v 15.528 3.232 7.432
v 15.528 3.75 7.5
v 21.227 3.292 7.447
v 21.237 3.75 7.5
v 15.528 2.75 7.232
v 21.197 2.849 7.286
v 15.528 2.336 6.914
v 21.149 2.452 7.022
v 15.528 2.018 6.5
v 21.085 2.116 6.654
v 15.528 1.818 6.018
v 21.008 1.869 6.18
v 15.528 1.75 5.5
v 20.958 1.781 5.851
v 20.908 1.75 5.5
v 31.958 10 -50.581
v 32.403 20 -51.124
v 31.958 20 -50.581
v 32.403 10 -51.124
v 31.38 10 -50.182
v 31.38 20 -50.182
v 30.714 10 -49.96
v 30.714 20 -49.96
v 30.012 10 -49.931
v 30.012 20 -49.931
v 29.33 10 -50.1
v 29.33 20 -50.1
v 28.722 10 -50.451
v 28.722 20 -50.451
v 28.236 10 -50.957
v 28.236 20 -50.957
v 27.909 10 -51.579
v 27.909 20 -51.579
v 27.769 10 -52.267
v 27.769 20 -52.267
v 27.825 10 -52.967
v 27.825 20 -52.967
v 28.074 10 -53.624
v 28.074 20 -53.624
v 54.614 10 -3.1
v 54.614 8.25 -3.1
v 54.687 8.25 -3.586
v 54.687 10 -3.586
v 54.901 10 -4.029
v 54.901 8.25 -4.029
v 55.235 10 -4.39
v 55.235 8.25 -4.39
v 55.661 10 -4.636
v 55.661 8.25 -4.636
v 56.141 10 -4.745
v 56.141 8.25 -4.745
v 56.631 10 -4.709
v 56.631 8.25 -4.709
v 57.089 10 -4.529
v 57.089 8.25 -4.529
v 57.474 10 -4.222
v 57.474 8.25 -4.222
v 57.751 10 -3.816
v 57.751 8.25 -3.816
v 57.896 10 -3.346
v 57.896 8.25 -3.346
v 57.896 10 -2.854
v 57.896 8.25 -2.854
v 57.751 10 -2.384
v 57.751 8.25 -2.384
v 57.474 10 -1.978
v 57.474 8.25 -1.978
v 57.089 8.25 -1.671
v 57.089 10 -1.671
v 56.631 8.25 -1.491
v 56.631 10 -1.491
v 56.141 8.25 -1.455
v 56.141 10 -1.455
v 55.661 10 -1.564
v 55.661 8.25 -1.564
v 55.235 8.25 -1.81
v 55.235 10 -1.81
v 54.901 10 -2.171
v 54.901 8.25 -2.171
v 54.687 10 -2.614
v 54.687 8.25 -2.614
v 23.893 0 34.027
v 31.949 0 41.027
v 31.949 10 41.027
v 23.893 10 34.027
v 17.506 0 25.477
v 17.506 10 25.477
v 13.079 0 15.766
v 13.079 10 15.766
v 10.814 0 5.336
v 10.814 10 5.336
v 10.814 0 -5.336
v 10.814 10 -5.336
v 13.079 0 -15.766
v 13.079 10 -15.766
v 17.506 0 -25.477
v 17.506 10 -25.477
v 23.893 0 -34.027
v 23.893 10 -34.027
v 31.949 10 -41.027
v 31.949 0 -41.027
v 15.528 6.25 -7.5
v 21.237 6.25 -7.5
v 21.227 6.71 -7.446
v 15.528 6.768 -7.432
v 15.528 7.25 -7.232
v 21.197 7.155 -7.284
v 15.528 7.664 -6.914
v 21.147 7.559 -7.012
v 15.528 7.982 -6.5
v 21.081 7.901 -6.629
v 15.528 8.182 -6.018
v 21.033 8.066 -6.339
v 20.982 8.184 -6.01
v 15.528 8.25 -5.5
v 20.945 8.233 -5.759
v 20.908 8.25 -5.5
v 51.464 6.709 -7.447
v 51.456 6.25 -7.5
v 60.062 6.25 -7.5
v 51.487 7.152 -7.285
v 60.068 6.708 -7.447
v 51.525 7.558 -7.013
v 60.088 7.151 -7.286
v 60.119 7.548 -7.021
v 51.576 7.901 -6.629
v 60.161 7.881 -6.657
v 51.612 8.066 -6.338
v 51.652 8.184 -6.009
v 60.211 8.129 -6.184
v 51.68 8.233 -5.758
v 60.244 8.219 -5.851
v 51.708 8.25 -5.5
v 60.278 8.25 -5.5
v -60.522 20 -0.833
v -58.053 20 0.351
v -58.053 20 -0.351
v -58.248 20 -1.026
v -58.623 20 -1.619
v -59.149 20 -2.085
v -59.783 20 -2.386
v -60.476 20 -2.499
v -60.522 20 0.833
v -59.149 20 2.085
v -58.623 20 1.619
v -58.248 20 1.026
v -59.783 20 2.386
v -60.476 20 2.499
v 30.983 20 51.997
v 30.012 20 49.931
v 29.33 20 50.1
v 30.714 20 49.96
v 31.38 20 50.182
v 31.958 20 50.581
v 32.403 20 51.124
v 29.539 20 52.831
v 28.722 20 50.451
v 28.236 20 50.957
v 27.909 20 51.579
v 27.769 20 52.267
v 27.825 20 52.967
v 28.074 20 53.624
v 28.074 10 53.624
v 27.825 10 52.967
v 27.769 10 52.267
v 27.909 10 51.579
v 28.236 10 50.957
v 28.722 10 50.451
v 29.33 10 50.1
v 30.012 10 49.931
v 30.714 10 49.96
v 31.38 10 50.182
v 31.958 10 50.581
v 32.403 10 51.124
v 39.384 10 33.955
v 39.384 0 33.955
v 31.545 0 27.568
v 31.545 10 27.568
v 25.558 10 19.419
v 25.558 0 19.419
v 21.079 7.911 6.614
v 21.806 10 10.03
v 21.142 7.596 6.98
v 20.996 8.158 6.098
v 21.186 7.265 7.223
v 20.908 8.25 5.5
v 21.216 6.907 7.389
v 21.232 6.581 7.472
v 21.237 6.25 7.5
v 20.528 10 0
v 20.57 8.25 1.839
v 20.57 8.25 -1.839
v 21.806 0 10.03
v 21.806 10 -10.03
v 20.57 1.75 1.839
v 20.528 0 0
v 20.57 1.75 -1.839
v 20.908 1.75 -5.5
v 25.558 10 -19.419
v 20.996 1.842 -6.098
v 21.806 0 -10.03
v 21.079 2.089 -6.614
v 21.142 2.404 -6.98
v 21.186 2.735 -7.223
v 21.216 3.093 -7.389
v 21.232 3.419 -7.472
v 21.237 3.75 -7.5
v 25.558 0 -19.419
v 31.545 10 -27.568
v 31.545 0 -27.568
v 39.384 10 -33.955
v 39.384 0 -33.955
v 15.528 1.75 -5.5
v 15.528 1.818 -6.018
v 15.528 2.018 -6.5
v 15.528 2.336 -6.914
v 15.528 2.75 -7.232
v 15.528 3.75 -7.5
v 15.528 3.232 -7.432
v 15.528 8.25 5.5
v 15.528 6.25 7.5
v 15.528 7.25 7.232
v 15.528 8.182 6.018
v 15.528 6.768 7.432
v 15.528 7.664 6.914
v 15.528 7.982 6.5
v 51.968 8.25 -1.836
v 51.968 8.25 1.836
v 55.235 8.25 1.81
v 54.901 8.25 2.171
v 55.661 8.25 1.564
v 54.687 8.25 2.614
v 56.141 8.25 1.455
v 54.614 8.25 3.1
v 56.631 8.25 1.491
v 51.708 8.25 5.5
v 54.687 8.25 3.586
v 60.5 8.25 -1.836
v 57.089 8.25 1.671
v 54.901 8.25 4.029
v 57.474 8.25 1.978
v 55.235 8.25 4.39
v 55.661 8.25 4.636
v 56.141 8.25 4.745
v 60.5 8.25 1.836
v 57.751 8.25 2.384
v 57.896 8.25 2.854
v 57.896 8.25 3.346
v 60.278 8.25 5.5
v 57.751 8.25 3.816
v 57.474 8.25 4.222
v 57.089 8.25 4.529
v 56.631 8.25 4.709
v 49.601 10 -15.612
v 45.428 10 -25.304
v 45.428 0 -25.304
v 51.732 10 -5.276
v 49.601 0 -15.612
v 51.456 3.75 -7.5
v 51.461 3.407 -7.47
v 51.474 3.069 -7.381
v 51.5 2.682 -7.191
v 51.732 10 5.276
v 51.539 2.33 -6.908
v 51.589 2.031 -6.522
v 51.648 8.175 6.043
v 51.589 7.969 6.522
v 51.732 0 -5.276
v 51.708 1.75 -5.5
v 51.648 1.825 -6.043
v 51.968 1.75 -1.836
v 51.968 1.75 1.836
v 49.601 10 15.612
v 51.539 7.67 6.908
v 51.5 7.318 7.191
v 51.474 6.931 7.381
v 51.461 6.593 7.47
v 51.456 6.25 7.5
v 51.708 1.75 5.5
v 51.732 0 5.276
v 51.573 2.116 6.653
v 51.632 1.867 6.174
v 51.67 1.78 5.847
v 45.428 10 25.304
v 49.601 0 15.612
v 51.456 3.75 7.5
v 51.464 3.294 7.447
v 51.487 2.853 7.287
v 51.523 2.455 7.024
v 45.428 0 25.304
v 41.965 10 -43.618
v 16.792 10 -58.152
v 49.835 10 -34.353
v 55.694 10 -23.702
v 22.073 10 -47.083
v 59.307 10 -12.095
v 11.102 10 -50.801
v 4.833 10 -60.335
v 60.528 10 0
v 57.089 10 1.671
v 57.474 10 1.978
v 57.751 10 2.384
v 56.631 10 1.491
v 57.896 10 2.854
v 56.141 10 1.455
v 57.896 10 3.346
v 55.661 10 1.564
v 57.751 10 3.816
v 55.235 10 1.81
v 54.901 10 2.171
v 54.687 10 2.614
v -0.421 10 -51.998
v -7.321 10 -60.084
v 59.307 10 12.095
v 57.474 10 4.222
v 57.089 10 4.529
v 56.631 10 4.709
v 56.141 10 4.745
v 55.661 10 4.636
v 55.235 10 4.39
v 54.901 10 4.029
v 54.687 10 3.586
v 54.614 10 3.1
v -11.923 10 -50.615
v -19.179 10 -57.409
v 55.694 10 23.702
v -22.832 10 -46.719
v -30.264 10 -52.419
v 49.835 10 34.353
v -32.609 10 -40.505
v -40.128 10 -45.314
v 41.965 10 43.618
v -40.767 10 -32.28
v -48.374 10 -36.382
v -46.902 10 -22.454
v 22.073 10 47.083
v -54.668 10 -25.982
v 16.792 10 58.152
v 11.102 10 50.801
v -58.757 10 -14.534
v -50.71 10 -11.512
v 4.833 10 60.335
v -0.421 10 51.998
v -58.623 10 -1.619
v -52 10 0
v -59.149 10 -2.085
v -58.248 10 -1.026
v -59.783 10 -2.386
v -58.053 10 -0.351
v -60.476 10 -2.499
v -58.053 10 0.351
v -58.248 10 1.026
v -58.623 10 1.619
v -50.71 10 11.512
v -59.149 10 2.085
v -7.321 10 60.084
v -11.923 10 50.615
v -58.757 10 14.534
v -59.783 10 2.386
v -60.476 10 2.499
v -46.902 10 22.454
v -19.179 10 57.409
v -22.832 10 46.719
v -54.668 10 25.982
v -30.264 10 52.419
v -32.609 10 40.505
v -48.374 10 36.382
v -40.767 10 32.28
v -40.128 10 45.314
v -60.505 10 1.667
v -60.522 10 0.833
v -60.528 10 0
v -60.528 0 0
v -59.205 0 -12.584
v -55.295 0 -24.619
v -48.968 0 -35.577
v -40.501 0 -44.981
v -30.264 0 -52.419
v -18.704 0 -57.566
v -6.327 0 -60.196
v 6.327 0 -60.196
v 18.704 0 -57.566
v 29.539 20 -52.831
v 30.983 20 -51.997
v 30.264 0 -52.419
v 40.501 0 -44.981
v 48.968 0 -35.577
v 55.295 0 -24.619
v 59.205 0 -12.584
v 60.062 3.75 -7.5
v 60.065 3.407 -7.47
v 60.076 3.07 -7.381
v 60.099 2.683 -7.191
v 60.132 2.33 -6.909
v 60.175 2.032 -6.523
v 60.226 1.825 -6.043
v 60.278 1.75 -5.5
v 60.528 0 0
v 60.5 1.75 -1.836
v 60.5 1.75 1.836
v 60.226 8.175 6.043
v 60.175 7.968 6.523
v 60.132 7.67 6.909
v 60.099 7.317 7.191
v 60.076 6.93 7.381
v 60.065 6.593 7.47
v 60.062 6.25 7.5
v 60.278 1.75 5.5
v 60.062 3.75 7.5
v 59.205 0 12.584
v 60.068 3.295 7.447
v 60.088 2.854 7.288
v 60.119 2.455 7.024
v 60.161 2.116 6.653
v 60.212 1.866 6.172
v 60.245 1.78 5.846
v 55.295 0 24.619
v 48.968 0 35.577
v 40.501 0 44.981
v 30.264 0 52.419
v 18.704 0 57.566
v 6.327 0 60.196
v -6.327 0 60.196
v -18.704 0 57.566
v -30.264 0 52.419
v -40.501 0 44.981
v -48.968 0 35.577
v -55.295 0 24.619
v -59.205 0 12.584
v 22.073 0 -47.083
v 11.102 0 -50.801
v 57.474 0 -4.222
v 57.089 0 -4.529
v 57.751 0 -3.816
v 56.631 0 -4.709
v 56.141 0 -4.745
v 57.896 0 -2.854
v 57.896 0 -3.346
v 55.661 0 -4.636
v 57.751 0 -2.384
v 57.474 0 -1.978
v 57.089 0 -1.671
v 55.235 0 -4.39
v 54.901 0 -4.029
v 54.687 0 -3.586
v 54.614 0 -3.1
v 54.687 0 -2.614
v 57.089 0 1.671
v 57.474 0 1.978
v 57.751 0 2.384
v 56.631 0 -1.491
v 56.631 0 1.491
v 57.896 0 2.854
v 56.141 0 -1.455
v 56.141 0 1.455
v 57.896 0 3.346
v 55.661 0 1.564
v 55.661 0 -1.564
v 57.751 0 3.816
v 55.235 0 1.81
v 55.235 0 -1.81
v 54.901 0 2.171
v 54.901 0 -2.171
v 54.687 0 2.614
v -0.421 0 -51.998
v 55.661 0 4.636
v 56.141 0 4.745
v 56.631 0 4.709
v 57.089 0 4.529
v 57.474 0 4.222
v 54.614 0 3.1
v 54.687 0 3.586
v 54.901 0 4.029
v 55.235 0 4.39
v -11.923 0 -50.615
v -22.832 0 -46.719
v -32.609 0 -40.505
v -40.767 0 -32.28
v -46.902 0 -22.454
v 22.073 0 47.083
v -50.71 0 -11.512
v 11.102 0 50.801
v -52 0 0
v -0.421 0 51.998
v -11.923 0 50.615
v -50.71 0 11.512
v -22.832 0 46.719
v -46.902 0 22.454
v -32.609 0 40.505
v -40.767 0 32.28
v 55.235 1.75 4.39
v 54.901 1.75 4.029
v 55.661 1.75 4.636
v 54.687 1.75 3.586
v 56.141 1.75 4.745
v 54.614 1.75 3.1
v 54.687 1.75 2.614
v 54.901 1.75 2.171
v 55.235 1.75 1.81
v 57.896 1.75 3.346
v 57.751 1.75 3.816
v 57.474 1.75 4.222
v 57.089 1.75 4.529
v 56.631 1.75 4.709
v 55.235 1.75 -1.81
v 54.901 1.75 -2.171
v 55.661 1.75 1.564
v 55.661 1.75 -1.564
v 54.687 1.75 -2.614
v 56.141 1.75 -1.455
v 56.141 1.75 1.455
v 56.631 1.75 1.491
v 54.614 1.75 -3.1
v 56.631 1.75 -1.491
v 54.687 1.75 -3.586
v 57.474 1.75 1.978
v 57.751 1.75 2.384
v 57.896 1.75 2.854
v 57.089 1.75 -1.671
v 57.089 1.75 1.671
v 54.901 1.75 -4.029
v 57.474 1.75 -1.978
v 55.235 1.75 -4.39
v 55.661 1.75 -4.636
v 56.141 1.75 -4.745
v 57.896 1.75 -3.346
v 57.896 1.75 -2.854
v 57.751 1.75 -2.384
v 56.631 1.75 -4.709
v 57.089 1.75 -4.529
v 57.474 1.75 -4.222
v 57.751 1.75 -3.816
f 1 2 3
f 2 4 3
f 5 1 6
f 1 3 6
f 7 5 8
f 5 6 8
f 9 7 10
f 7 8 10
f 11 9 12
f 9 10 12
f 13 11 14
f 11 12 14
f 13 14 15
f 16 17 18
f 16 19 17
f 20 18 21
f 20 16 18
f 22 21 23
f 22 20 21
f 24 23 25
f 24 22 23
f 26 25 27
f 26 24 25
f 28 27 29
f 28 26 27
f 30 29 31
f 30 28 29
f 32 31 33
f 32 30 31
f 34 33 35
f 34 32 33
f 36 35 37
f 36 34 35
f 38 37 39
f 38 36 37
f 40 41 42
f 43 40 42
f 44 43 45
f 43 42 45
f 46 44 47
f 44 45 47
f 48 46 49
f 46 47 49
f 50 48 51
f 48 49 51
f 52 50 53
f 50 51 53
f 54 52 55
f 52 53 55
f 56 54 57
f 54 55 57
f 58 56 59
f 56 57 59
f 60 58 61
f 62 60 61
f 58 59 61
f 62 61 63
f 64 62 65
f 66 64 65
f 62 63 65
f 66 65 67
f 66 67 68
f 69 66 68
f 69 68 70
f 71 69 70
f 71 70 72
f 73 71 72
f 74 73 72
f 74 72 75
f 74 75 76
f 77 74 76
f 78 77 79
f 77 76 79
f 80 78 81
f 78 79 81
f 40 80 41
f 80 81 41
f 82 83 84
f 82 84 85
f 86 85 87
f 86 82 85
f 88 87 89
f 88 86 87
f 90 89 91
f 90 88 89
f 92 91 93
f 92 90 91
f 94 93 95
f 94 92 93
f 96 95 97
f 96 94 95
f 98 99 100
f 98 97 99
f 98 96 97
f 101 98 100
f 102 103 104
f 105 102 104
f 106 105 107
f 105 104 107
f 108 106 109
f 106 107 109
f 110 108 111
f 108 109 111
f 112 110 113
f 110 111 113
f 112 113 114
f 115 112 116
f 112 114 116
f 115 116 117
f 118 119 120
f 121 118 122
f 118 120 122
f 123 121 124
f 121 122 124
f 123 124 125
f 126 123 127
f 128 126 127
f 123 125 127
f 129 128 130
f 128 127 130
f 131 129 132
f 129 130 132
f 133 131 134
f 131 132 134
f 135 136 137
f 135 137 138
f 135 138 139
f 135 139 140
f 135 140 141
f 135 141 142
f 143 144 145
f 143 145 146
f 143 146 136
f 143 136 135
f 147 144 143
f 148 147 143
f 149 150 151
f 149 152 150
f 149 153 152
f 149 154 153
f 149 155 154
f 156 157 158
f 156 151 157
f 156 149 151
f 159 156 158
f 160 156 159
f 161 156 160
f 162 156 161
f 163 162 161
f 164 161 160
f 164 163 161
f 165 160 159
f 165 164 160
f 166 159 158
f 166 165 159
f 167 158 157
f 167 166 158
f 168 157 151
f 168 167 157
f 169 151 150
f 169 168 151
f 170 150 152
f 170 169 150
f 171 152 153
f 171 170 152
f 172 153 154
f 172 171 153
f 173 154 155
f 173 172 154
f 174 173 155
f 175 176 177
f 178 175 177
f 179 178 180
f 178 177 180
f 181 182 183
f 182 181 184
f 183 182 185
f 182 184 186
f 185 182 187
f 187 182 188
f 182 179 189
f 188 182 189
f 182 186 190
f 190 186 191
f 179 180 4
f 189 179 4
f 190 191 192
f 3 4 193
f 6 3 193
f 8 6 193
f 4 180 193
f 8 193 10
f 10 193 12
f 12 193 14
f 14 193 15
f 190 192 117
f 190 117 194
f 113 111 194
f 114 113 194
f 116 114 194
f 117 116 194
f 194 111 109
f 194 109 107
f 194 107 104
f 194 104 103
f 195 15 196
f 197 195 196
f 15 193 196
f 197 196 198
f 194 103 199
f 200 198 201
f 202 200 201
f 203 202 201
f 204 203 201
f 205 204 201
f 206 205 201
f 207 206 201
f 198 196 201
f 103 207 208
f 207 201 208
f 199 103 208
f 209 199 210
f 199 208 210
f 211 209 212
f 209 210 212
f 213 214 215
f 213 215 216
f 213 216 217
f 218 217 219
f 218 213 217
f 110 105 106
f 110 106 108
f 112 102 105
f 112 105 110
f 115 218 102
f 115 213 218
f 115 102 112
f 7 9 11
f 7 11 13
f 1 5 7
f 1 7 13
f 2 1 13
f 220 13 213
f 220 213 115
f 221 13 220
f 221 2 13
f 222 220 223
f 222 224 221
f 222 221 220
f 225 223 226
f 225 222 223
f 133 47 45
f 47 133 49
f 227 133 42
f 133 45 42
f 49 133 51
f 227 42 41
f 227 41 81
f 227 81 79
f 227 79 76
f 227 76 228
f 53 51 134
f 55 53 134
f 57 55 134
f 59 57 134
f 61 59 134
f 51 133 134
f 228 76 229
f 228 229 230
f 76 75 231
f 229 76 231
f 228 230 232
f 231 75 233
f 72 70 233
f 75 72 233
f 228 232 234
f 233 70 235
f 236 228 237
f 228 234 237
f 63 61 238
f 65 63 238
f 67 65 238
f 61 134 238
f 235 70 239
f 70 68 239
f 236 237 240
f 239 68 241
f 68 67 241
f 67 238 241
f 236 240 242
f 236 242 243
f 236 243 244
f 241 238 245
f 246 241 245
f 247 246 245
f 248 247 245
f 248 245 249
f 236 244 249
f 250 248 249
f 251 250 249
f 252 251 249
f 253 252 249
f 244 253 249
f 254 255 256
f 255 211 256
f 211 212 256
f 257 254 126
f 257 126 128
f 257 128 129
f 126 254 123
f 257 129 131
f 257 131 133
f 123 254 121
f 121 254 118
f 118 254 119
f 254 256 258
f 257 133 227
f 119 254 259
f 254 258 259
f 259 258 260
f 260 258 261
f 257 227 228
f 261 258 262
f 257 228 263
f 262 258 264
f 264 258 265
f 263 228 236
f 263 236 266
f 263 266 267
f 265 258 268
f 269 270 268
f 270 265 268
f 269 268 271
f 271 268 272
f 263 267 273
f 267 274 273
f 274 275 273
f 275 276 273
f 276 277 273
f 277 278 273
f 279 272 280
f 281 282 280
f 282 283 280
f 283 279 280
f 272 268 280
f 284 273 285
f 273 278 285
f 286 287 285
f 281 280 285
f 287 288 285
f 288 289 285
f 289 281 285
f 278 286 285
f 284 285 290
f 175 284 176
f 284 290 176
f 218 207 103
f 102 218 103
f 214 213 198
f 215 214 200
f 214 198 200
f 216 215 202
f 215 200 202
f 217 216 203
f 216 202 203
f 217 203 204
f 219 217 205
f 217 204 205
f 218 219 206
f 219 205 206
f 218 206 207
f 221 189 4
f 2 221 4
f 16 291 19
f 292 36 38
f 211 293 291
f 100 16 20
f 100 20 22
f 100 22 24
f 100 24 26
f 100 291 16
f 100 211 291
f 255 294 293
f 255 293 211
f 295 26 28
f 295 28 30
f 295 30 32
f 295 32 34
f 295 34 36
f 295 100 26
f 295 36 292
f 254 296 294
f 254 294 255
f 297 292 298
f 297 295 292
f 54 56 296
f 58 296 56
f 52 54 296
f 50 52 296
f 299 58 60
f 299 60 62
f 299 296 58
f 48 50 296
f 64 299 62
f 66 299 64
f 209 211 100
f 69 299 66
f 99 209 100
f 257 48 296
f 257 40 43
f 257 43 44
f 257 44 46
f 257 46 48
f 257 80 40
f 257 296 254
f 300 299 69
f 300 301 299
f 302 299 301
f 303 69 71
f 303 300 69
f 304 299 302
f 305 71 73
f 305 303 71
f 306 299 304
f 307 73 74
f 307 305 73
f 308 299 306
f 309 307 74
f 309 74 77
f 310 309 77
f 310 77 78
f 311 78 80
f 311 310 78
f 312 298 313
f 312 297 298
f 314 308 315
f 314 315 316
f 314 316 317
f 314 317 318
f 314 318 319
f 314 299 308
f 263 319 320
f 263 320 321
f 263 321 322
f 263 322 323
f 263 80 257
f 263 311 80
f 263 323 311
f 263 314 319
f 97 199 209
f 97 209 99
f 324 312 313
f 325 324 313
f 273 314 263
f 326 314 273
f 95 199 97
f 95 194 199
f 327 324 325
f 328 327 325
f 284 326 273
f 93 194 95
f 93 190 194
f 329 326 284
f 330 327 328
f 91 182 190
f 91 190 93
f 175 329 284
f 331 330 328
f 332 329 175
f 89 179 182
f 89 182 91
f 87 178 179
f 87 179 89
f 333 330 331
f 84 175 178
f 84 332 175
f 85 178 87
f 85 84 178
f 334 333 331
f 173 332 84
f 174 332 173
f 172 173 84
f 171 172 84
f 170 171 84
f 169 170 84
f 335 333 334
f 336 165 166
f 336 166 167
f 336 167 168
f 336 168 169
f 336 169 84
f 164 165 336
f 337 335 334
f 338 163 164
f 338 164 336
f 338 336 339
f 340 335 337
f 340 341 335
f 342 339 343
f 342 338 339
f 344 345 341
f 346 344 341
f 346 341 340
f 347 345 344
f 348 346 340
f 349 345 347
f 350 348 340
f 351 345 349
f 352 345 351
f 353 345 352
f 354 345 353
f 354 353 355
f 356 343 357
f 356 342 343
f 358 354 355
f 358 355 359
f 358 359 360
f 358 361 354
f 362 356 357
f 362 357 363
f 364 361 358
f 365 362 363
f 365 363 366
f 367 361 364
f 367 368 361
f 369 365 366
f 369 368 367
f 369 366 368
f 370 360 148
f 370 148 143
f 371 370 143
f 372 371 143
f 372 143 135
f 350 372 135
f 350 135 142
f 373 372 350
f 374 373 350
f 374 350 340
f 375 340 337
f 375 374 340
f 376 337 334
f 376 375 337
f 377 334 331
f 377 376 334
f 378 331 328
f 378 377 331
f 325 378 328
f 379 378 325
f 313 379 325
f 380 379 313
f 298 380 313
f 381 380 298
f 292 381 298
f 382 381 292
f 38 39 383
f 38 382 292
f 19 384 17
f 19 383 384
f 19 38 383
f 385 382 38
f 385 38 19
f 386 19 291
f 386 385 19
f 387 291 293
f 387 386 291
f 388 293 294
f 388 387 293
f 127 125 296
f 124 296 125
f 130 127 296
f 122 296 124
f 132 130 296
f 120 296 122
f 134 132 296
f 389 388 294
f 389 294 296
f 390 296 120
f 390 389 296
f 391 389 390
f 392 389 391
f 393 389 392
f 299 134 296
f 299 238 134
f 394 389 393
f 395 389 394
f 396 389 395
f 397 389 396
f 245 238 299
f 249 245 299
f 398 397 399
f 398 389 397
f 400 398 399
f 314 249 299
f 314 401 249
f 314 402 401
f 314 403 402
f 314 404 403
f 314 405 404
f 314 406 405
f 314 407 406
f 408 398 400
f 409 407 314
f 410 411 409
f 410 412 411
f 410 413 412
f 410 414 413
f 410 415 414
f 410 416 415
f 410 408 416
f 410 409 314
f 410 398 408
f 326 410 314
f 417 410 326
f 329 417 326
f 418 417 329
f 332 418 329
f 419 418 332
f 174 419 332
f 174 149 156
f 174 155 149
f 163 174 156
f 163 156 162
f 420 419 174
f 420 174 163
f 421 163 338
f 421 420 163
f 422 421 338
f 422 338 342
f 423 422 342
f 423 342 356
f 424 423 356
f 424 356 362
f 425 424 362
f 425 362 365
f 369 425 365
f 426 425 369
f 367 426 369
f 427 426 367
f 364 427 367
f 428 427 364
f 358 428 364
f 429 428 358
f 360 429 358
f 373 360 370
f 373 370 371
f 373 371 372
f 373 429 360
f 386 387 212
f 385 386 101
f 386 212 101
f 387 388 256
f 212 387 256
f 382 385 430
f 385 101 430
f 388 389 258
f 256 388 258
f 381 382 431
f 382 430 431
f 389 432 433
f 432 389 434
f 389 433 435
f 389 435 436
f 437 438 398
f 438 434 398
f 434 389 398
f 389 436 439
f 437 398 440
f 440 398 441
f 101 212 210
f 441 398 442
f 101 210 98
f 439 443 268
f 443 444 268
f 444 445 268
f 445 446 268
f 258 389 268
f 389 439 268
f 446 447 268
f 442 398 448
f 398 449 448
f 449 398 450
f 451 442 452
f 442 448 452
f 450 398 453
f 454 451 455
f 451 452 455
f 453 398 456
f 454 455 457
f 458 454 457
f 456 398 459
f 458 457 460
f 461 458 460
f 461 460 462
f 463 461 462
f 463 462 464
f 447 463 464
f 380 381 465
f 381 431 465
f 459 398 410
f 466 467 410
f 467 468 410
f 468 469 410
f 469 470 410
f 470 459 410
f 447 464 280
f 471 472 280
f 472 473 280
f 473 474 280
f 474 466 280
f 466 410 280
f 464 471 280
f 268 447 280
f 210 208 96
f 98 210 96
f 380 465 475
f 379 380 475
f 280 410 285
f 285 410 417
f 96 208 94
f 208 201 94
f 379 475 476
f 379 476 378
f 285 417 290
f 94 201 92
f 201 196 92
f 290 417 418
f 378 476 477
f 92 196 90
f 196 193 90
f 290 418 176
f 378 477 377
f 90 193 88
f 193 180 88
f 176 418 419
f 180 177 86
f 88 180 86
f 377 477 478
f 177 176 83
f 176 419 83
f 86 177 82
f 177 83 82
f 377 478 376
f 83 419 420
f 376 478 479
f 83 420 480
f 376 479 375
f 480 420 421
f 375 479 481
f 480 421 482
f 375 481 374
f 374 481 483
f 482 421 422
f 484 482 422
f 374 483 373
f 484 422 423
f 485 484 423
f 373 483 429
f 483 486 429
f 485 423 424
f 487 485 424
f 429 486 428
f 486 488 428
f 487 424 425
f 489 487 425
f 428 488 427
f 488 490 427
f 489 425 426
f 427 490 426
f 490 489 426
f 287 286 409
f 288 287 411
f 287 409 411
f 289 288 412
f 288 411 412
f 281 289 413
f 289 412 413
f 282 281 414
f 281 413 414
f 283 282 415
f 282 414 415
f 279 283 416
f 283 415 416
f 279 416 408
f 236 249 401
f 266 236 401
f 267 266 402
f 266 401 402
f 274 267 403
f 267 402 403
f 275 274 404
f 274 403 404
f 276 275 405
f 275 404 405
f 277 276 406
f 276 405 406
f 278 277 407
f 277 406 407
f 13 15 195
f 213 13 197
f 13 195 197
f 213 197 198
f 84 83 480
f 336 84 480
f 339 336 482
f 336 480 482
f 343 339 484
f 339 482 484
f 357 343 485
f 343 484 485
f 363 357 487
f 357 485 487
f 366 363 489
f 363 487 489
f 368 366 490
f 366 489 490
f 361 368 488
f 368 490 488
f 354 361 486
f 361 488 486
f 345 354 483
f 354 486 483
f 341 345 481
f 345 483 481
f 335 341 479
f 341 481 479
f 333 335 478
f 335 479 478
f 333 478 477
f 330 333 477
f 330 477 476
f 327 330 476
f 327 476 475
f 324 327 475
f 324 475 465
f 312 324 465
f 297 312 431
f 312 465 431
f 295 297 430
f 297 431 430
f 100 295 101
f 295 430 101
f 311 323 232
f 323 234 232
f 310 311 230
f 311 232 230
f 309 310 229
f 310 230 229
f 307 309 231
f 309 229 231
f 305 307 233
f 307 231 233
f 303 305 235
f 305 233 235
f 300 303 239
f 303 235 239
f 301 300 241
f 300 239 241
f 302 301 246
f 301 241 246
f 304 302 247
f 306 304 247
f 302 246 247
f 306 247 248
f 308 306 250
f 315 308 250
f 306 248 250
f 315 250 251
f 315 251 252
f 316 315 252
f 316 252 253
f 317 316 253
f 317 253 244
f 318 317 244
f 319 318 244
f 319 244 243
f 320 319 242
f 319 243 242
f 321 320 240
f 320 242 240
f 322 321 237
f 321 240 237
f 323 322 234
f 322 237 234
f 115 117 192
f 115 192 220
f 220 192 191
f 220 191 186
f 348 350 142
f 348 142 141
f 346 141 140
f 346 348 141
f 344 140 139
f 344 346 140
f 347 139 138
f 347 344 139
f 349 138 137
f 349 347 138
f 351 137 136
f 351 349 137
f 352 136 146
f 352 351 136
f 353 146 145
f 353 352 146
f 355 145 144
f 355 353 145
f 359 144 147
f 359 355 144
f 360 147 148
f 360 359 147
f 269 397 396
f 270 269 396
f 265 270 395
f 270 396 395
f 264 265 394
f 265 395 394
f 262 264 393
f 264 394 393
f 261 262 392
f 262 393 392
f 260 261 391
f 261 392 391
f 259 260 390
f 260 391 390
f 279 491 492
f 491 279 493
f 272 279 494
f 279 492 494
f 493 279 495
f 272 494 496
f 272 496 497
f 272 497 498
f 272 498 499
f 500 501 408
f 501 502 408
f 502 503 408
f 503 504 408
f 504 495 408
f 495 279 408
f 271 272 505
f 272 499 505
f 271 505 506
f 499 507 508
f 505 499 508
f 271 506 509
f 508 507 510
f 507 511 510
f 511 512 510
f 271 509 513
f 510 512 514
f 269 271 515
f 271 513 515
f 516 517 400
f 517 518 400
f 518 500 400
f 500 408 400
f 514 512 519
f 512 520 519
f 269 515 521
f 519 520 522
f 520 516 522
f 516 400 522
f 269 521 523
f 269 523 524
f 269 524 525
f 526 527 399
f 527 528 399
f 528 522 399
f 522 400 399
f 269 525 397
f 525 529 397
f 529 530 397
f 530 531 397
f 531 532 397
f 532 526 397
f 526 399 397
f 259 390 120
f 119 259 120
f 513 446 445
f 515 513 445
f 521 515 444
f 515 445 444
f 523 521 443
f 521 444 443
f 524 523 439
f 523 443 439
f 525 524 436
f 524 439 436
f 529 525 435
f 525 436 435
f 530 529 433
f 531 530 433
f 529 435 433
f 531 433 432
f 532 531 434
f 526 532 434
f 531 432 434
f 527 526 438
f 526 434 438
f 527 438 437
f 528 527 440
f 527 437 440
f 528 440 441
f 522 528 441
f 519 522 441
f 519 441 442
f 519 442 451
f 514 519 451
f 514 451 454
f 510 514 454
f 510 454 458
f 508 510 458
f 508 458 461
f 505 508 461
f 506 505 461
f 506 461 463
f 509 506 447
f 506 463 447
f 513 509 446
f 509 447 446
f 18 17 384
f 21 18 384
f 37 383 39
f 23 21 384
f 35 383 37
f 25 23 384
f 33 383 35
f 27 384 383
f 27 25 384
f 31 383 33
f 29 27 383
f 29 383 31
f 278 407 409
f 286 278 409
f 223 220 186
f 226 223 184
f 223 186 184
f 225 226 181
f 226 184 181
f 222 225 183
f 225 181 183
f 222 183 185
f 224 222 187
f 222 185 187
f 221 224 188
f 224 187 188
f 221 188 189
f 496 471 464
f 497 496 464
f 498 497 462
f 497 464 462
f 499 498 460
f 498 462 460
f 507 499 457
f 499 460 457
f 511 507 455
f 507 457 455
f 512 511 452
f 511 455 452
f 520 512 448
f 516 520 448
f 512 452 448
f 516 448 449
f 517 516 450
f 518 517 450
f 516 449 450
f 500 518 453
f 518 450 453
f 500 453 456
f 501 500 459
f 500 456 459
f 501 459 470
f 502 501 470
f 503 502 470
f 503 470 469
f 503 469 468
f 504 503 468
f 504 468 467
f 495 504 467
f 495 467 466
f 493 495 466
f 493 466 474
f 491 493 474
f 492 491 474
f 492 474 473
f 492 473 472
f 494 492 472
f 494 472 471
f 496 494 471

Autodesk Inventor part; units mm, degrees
ref_plane "YZ Plane" through (0, 0, 0) normal (1, 0, 0) x (0, 1, 0)
ref_plane "XZ Plane" through (0, 0, 0) normal (0, 1, 0) x (-1, 0, 0)
sketch "Sketch4" plane through (0, 0, 0) normal (0, 1, 0) x (-1, 0, 0)
  circle A0 centre (0, 0) radius 60.528
  line L0 (-60.528, 0) -> (0, 0) construction
  circle A1 centre (0, 0) radius 52
  circle A2 centre (-60.528, 0) radius 50
  circle A3 centre (-60.528, 0) radius 40
  line L1 (-10.528, 0) -> (-20.528, 0) construction
  line L2 (-52, 0) -> (-60.528, 0) construction
  circle A4 centre (-15.528, 0) radius 3.1
  circle A5 centre (-56.264, 0) radius 3.1
  circle A6 centre (-56.264, -3.1) radius 1.65
  circle A7 centre (-56.264, 3.1) radius 1.65
  circle A8 centre (60.528, 0) radius 2.5
  circle A9 centre (-30.264, 52.4188) radius 2.5
  circle A10 centre (-30.264, -52.4188) radius 2.5
  line L3 (60.528, 0) -> (60.528, 0)
  point P0 (-39.3837, 33.9547)
  point P1 (-39.3837, -33.9547)
  point P2 (-31.9492, 41.0274)
  point P3 (-31.9492, -41.0274)
  point P4 (-28.0736, 53.6238)
  point P5 (-32.4028, 51.1243)
  point P6 (60.4764, 2.4995)
  point P7 (60.4764, -2.4995)
  point P8 (-32.4028, -51.1243)
  point P9 (-28.0736, -53.6238)
  dimension "d18" = 104
  dimension "d19" = 80
  dimension "d20" = 121.056
  dimension "d21" = 100
  dimension "d17" = 60.528
  dimension "d29" = 6.2
  dimension "d30" = 6.2
  dimension "d36" = 3.3
  dimension "d37" = 3.3
  dimension "d38" = 5
  dimension "d42" = 360
  dimension "d46" = 0
extrude "Extrusion3" add sketch "Sketch4" along normal blind 10 contours A0 A8 | A8 A0 A10 A2 A1 A9 | A9 A0 | A0 A10 | A2 A1 A3 A0 | A0 A3 A1 A2 | A3 A1 A0 | A2 A1 A3 | A4 | A5 A6 A7 picked at (59.7455, 0.5696) picked at (-29.7736, 51.7403) picked at (-29.7736, -51.7403)
ref_plane "Work Plane5" through (60.528, 0, 0) normal (1, 0, 0) x (0, 1, 0)
sketch "Sketch6" plane through (60.528, 0, 0) normal (1, 0, 0) x (0, 1, 0)
  line L0 (10, -60.528) -> (10, 60.528) projected
  line L1 (0, -60.528) -> (0, 60.528) projected
  line L2 (10, -60.528) -> (10, 60.528) projected
  line L3 (10, 0) -> (0, 0)
  line L4 (1.75, 5.5) -> (1.75, -5.5)
  line L5 (3.75, -7.5) -> (6.25, -7.5)
  line L6 (8.25, -5.5) -> (8.25, 5.5)
  line L7 (6.25, 7.5) -> (3.75, 7.5)
  line L8 (1.75, 7.5) -> (8.25, -7.5) construction
  line L9 (1.75, -7.5) -> (8.25, 7.5) construction
  arc A0 (6.25, -7.5) -> (8.25, -5.5) centre (6.25, -5.5) ccw
  arc A1 (1.75, -5.5) -> (3.75, -7.5) centre (3.75, -5.5) ccw
  arc A2 (8.25, 5.5) -> (6.25, 7.5) centre (6.25, 5.5) ccw
  arc A3 (3.75, 7.5) -> (1.75, 5.5) centre (3.75, 5.5) ccw
  point P0 (5, 0)
  dimension "d31" = 15
  dimension "d32" = 6.5
  dimension "d33" = 2
extrude "Extrusion4" cut sketch "Sketch6" against normal blind 45
extrude "Extrusion5" add sketch "Sketch4" along normal blind 20 contours A0 A8 | A9 A0 | A0 A10 picked at (59.7455, 0.5696) picked at (-29.7736, 51.7403) picked at (-29.7736, -51.7403)
